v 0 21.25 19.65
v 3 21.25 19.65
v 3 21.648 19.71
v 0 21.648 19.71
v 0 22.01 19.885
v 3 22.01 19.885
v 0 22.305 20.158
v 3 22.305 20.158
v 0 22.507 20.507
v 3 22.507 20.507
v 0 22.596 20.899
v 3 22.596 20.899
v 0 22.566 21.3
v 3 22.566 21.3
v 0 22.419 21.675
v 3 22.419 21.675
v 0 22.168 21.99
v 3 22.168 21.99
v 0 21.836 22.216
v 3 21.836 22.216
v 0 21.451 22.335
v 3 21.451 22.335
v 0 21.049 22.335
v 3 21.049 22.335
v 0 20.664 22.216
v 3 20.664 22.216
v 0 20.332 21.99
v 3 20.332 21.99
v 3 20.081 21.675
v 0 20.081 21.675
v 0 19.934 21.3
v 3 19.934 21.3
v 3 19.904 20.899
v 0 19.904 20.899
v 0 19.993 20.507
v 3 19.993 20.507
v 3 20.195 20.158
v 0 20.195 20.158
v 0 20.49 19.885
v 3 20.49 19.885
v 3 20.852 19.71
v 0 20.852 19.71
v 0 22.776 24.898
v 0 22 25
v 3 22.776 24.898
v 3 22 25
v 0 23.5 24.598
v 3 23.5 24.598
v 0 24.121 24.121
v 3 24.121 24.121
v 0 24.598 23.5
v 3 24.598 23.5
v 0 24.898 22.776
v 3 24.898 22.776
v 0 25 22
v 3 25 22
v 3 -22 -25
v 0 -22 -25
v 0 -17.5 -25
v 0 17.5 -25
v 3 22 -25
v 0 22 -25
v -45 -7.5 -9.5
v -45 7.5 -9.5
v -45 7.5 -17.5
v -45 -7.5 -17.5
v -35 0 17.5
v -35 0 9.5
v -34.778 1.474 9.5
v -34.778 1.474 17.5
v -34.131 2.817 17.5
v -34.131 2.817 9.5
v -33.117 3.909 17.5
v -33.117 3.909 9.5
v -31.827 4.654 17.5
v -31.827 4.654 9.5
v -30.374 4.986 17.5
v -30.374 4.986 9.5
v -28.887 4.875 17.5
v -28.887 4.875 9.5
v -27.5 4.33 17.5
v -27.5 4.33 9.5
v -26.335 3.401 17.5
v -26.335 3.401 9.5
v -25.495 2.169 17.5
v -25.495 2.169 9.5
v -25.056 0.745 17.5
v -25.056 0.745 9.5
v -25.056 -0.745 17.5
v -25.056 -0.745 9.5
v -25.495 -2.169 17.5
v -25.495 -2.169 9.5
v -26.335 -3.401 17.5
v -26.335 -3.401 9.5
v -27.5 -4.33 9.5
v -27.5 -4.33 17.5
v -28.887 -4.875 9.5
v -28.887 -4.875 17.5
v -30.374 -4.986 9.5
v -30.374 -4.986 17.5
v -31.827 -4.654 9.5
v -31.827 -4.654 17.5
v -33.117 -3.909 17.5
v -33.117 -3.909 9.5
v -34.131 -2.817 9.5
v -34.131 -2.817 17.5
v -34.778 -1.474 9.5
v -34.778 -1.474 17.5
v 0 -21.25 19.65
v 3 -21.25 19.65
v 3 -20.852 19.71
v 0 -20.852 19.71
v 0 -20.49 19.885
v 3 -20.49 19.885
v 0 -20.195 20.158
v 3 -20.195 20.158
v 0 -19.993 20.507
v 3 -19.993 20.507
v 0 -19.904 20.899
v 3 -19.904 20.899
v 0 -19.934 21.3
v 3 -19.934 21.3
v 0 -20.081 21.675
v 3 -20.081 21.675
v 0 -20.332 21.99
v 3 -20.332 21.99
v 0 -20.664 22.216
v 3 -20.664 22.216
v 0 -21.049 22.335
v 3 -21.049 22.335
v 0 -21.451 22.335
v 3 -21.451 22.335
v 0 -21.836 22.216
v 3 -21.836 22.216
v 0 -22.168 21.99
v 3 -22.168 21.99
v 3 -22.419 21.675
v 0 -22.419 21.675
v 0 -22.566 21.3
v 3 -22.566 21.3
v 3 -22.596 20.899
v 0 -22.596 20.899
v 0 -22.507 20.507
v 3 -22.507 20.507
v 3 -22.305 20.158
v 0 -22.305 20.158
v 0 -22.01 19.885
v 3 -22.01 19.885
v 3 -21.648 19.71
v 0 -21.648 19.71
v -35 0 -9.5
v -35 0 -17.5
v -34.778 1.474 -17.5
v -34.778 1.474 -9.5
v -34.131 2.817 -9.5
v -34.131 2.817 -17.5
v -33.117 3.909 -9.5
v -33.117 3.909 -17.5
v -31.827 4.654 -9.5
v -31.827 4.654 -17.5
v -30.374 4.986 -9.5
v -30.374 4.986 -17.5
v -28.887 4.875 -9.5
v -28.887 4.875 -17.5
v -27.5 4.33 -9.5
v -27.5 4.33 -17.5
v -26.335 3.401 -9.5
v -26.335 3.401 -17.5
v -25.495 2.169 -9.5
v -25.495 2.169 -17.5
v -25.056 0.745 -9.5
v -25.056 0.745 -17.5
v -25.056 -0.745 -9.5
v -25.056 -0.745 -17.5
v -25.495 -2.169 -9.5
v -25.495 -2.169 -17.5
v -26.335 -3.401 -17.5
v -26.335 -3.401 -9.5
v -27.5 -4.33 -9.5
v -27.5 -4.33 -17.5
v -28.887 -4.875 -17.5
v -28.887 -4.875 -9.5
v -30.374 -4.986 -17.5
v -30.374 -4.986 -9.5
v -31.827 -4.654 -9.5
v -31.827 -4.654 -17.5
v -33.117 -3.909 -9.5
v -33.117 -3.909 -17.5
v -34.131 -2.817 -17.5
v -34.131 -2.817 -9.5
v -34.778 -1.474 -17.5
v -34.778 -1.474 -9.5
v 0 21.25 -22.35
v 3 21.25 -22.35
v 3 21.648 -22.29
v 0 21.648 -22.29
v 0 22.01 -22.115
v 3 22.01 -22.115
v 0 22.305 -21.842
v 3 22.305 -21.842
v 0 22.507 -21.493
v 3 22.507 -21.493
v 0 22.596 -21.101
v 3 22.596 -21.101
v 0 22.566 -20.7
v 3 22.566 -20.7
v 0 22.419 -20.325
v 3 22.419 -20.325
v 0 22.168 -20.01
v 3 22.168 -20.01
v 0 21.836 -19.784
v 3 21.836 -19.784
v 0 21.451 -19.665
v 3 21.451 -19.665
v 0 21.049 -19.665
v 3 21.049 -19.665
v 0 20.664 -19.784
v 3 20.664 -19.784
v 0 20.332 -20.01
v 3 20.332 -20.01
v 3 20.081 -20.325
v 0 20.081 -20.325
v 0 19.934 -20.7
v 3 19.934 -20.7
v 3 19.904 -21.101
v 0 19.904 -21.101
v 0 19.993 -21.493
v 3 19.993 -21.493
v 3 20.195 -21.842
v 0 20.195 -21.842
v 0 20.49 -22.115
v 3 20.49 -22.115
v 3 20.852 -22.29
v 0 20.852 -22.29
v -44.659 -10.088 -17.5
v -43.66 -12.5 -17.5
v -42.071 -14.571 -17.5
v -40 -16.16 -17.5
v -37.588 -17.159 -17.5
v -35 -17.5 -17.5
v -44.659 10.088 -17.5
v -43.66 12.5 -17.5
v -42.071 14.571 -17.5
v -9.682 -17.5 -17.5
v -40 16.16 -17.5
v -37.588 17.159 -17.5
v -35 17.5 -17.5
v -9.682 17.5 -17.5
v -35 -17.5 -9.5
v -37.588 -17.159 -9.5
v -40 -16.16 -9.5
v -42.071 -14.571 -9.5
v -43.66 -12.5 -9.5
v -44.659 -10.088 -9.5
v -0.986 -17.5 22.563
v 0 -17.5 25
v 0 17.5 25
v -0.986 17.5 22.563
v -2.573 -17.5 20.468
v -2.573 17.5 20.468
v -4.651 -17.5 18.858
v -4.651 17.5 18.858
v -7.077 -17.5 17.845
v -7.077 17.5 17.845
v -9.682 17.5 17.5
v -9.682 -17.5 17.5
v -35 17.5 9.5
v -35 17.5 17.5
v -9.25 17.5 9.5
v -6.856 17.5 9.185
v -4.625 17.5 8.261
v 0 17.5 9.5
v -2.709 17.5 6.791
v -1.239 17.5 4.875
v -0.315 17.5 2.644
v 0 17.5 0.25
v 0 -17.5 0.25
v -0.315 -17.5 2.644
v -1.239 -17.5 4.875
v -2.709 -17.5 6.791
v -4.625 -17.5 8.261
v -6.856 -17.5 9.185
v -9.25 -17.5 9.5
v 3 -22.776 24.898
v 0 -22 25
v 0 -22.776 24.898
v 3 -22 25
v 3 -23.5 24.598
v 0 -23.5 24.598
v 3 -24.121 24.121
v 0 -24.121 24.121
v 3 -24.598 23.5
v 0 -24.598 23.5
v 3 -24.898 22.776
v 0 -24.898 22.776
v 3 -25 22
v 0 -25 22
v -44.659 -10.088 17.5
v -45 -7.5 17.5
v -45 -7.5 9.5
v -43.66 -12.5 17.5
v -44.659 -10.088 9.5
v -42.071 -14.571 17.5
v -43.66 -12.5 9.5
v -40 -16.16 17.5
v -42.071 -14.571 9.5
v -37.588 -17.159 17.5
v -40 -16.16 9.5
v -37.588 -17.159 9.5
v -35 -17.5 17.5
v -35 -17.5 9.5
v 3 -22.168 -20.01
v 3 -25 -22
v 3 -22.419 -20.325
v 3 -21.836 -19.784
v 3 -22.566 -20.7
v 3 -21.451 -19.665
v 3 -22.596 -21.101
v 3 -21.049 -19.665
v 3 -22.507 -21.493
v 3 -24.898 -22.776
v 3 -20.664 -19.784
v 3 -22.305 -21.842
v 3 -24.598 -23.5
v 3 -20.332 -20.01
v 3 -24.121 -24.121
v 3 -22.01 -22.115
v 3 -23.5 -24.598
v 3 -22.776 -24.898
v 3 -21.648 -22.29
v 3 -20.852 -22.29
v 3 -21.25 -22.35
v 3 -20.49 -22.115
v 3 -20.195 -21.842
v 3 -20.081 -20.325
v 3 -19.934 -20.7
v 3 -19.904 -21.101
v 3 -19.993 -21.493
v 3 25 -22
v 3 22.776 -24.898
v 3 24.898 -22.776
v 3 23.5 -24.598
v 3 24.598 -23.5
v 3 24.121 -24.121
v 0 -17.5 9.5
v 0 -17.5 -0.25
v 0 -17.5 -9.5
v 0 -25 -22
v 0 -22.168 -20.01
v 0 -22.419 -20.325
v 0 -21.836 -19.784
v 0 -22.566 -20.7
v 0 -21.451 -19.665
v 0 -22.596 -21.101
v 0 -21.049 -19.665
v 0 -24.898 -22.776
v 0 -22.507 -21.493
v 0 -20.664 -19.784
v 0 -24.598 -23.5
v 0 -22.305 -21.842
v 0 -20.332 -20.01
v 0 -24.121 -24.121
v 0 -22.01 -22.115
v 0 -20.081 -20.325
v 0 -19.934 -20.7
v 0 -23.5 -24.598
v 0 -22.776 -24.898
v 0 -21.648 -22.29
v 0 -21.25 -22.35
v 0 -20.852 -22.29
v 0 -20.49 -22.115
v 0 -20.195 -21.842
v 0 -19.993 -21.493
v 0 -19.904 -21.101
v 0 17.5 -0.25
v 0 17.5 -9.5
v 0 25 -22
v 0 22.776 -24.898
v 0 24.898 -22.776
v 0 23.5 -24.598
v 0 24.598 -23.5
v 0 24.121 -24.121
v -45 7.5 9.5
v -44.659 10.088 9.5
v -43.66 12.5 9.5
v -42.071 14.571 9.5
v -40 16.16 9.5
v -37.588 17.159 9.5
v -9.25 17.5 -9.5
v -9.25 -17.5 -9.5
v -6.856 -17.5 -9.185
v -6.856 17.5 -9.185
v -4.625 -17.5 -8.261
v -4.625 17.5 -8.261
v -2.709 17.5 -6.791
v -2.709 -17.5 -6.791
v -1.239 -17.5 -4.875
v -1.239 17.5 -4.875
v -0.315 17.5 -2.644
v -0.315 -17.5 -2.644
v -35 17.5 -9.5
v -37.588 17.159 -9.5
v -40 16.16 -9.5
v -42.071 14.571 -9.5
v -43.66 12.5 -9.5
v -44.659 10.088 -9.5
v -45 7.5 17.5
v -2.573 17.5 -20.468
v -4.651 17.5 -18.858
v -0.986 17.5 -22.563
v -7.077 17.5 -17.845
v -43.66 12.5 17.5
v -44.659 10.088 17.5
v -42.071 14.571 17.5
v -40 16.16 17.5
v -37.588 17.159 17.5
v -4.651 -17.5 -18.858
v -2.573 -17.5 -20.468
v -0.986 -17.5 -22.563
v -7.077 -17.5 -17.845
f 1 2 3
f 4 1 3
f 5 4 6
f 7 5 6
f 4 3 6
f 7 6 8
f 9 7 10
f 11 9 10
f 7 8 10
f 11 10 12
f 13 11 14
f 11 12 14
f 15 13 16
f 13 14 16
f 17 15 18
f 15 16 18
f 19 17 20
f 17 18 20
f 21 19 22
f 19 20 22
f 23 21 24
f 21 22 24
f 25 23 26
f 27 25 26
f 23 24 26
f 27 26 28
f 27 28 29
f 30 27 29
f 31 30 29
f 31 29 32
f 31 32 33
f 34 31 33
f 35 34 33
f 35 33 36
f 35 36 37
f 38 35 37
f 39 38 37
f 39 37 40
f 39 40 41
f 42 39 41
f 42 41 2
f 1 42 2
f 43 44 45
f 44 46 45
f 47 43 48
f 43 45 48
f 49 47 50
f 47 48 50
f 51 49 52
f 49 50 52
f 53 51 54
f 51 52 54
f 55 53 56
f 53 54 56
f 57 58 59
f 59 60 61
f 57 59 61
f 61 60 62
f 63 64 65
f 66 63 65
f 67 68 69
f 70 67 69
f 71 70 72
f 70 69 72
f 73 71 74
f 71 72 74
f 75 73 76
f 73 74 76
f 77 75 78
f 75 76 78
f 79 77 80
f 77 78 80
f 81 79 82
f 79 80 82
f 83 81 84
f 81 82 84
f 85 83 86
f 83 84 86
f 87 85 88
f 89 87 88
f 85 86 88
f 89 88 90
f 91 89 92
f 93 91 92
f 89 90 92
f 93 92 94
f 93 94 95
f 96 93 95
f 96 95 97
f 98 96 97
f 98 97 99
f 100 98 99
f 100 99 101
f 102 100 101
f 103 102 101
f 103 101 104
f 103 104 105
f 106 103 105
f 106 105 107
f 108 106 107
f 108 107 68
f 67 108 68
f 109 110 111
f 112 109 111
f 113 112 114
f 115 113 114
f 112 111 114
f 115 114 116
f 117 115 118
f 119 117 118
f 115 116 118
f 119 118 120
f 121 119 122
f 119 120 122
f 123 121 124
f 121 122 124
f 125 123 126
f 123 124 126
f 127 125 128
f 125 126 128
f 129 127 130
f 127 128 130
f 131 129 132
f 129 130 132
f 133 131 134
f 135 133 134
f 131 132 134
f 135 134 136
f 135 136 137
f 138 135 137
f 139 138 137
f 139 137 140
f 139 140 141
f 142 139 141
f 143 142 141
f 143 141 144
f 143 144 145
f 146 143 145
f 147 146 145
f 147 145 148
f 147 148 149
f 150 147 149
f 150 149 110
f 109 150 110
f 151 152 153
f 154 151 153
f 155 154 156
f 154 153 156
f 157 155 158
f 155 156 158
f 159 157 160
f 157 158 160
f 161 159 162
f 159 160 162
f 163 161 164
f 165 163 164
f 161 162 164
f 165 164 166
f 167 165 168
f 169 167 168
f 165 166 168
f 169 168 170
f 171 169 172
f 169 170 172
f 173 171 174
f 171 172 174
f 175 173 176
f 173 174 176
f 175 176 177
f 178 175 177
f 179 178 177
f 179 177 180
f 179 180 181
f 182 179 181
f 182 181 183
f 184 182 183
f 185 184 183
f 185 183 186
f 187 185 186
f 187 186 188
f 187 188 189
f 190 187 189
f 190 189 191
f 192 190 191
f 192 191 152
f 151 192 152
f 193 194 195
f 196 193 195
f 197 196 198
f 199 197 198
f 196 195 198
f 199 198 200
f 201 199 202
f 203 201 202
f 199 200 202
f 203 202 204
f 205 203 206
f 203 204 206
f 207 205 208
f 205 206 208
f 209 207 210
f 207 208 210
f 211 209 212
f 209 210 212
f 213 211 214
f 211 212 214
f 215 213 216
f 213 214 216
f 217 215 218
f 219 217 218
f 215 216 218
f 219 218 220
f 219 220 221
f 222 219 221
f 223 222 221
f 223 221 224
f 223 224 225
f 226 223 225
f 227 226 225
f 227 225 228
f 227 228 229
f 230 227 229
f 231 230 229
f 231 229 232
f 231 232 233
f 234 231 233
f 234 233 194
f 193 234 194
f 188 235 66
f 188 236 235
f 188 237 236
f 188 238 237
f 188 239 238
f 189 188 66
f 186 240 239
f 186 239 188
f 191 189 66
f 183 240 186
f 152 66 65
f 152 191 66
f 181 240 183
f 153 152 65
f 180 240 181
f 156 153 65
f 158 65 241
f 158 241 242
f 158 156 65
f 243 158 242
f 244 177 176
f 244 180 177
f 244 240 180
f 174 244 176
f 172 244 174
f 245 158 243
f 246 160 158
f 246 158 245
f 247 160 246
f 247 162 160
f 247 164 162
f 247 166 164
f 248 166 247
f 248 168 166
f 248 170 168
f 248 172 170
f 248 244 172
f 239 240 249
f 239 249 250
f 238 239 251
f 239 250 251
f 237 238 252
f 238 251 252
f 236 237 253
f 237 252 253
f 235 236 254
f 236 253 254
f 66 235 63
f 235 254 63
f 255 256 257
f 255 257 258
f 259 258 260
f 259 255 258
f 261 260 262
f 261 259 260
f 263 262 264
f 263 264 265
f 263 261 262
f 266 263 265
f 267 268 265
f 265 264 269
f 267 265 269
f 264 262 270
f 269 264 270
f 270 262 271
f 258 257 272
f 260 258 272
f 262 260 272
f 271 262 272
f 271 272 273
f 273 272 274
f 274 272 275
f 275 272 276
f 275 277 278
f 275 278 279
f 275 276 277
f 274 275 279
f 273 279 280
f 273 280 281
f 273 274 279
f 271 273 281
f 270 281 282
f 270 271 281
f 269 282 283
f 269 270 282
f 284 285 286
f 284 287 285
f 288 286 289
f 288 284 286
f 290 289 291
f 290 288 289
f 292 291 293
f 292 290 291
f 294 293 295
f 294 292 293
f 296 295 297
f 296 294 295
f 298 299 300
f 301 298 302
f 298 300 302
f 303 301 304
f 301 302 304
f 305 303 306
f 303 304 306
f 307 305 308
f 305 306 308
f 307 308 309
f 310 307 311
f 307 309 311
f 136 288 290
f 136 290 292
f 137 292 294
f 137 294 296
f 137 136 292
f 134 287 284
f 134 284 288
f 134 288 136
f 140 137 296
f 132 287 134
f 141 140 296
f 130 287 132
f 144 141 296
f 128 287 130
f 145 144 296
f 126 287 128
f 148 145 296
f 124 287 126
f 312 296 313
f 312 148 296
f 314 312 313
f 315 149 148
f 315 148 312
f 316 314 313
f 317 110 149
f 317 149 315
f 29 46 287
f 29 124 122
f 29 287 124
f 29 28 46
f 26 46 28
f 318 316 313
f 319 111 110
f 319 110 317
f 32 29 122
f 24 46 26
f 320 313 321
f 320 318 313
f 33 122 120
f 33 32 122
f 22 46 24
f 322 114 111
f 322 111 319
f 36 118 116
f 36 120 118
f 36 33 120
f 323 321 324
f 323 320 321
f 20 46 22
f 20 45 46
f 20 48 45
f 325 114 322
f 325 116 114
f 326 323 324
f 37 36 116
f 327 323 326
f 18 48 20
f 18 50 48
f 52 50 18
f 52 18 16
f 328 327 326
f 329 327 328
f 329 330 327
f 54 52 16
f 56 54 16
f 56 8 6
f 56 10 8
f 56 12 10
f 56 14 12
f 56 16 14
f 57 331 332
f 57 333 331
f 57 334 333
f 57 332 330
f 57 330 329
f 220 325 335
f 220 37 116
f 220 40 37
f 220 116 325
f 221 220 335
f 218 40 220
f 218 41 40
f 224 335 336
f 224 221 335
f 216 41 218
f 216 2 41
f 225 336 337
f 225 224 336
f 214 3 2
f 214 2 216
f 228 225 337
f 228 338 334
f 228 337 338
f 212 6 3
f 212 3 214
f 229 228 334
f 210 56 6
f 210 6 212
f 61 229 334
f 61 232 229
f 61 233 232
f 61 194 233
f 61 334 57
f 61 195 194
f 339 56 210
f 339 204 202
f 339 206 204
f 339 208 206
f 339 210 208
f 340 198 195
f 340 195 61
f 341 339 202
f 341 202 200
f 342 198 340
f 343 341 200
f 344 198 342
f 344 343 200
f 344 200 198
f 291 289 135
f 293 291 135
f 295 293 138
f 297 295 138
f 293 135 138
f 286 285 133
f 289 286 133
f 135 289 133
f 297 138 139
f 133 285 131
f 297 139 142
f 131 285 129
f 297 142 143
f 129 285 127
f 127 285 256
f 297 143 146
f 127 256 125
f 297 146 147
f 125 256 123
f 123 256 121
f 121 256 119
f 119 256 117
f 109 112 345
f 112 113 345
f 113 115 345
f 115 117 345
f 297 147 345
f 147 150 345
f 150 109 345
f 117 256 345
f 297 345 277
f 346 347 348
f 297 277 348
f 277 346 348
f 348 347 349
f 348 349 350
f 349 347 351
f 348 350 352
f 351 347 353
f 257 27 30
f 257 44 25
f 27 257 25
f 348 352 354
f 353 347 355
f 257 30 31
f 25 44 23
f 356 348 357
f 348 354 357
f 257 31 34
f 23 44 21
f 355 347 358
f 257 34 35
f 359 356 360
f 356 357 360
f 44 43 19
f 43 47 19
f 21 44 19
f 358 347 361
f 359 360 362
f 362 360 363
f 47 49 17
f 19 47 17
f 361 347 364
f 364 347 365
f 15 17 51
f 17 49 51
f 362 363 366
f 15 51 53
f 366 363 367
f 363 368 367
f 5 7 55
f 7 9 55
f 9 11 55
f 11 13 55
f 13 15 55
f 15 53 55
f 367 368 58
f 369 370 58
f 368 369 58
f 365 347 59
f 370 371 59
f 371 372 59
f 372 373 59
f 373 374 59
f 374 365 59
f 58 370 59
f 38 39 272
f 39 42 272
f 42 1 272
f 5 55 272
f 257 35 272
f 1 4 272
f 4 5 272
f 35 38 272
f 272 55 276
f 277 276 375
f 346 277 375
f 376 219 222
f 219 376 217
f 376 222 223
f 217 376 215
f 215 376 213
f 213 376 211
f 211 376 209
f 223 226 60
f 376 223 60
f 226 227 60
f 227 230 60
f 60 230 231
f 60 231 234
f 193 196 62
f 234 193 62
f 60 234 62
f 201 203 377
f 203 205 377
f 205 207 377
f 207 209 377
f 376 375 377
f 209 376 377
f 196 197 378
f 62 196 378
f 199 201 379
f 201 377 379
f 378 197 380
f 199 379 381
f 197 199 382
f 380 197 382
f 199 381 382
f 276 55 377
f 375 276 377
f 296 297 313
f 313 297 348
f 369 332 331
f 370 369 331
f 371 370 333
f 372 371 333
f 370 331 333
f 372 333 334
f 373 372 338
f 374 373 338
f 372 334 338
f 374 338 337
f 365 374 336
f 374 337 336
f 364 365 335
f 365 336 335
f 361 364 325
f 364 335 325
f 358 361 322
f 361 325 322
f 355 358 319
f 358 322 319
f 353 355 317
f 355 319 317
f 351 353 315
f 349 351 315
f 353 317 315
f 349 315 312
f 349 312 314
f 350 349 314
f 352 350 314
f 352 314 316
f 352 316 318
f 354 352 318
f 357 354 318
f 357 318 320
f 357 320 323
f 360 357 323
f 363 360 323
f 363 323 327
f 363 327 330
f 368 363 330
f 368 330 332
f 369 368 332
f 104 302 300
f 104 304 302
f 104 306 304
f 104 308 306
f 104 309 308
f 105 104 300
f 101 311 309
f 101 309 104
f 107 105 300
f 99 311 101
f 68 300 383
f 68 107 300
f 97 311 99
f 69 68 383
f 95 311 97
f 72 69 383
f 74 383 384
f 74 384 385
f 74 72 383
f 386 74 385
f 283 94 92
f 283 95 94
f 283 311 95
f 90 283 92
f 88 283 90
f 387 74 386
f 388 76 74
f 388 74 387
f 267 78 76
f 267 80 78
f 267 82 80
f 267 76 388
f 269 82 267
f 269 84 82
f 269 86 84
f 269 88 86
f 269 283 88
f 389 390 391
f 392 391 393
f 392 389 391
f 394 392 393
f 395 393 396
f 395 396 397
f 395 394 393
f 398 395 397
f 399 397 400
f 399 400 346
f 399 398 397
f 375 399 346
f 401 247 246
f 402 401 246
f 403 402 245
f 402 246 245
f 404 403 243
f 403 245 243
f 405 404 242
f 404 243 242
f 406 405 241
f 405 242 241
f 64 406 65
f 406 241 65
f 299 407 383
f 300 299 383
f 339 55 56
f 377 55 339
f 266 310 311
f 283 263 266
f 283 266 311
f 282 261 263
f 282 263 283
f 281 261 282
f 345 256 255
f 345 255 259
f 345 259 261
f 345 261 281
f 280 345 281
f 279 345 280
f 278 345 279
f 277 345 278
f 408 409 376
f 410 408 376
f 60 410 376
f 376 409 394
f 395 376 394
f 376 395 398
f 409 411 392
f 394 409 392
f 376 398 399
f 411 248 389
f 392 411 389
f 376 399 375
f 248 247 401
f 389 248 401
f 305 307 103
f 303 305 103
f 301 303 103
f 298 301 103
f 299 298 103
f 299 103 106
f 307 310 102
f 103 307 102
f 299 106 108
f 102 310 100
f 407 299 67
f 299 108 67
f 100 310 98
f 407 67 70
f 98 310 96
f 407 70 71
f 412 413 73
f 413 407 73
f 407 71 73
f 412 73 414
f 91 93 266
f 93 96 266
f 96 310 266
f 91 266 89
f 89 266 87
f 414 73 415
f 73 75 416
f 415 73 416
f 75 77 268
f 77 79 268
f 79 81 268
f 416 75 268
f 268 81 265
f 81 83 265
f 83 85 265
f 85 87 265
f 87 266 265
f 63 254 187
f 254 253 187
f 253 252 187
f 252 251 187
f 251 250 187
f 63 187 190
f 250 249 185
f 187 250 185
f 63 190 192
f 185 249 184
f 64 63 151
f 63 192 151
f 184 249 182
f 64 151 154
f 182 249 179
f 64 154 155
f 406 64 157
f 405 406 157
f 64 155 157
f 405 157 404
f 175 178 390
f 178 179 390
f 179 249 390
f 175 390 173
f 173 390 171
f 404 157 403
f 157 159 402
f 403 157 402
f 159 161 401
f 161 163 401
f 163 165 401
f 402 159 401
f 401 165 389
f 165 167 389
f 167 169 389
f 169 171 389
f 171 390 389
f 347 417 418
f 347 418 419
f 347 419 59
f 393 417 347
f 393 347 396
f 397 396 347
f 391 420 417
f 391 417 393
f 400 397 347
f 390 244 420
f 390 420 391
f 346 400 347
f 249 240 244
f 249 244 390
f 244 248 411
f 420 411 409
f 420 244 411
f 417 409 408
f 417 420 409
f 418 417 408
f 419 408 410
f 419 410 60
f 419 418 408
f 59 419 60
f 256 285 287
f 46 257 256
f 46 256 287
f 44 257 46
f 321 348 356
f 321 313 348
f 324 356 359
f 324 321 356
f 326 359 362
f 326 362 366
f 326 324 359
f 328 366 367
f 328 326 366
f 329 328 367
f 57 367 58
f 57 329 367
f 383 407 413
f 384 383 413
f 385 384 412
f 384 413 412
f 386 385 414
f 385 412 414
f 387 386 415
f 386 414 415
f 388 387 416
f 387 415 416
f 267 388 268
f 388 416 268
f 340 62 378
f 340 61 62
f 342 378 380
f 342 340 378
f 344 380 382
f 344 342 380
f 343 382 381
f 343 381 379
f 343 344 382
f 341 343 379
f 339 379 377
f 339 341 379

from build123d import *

# Parameters (mm, degrees)
ESQUISSE3_W             = 50
ESQUISSE3_H             = 50
BOSS_EXTRU_3_DEPTH      = 3
ESQUISSE4_W             = 8
ESQUISSE4_H             = 35
BOSS_EXTRU_5_DEPTH      = 45
ESQUISSE7_R             = 5
ENL_V_MAT_EXTRU_1_DEPTH = 40
CONG_1_R                = 10
CONG_2_R                = 9.25
CONG_3_R                = 3
D_GAGEMENT_M2_51_D      = 2.7


with BuildPart() as part:
    # Esquisse3 → Boss.-Extru.3 (new body)
    with BuildSketch(Plane(origin=(0, 0, 0), x_dir=(0, 0, -1), z_dir=(1, 0, 0))):
        Rectangle(ESQUISSE3_W, ESQUISSE3_H)
    extrude(amount=BOSS_EXTRU_3_DEPTH)

    # Esquisse4 → Boss.-Extru.5 (add)
    with BuildSketch(Plane(origin=(0, 0, 0), x_dir=(0, 0, -1), z_dir=(1, 0, 0))):
        with Locations((-13.5, 0)):
            Rectangle(ESQUISSE4_W, ESQUISSE4_H)
        with Locations((13.5, 0)):
            Rectangle(ESQUISSE4_W, ESQUISSE4_H)
    extrude(amount=-BOSS_EXTRU_5_DEPTH)

    # Esquisse7 → Enlèv. mat.-Extru.1 (cut)
    with BuildSketch(Plane(origin=(0, 0, -17.5), x_dir=(-1, 0, 0), z_dir=(0, 0, -1))):
        with Locations((30, 0)):
            Circle(ESQUISSE7_R)
    extrude(amount=-ENL_V_MAT_EXTRU_1_DEPTH, mode=Mode.SUBTRACT)

    # Congé1
    # the kernel refuses this fillet: 10 mm, written as the material it adds along each edge
    with BuildSketch(Plane(origin=(0, -17.5, 17.5), x_dir=(0, 0, 1), z_dir=(0, 1, 0))) as cong_1_piece_1:
        with BuildLine():
            CenterArc((10, -9.682458366), CONG_1_R, 104.477512186, 75.522487814)
            Line((0, -9.682458366), (0, 0))
            Line((0, 0), (7.5, 0))
        make_face()
    extrude(amount=35)
    with BuildSketch(Plane(origin=(0, -17.5, -17.5), x_dir=(0, 0, -1), z_dir=(0, 1, 0))) as cong_1_piece_2:
        with BuildLine():
            CenterArc((10, 9.682458366), CONG_1_R, 180, 75.522487814)
            Line((0, 9.682458366), (0, 0))
            Line((0, 0), (7.5, 0))
        make_face()
    extrude(amount=35)
    # the kernel refuses this fillet: 10 mm, written as the material it takes off along each edge
    with BuildSketch(Plane(origin=(-45, 17.5, 42.5), x_dir=(0, -1, 0), z_dir=(0, 0, -1)), Plane(origin=(-45, 17.5, -42.5), x_dir=(1, 0, 0), z_dir=(0, 0, 1))) as cong_1_2_piece_1:
        with BuildLine():
            CenterArc((CONG_1_R, -CONG_1_R), CONG_1_R, 90, 90)
            Line((0, -CONG_1_R), (0, 0))
            Line((0, 0), (CONG_1_R, 0))
        make_face()
    extrude(amount=58, mode=Mode.SUBTRACT)
    with BuildSketch(Plane(origin=(-45, -17.5, -15.5), x_dir=(1, 0, 0), z_dir=(0, 0, 1)), Plane(origin=(-45, -17.5, 15.5), x_dir=(0, 1, 0), z_dir=(0, 0, -1))) as cong_1_2_piece_2:
        with BuildLine():
            CenterArc((CONG_1_R, CONG_1_R), CONG_1_R, 180, 90)
            Line((0, CONG_1_R), (0, 0))
            Line((0, 0), (CONG_1_R, 0))
        make_face()
    extrude(amount=58, mode=Mode.SUBTRACT)

    # Congé2
    cong_2_edges = [part.edges().sort_by_distance(p)[0] for p in [
        (0, 0, 9.5),
        (0, 0, -9.5),
    ]]
    fillet(cong_2_edges, radius=CONG_2_R)

    # Congé3
    cong_3_edges = [part.edges().sort_by_distance(p)[0] for p in [
        (1.5, -25, -25),
        (1.5, -25, 25),
        (1.5, 25, 25),
        (1.5, 25, -25),
    ]]
    fillet(cong_3_edges, radius=CONG_3_R)

    # Dégagement M2.51 (through all)
    with Locations(Plane.ZY):
        with Locations((21, 21.25), (-21, 21.25), (-21, -21.25), (21, -21.25)):
            Hole(D_GAGEMENT_M2_51_D / 2)


solid = part.part
